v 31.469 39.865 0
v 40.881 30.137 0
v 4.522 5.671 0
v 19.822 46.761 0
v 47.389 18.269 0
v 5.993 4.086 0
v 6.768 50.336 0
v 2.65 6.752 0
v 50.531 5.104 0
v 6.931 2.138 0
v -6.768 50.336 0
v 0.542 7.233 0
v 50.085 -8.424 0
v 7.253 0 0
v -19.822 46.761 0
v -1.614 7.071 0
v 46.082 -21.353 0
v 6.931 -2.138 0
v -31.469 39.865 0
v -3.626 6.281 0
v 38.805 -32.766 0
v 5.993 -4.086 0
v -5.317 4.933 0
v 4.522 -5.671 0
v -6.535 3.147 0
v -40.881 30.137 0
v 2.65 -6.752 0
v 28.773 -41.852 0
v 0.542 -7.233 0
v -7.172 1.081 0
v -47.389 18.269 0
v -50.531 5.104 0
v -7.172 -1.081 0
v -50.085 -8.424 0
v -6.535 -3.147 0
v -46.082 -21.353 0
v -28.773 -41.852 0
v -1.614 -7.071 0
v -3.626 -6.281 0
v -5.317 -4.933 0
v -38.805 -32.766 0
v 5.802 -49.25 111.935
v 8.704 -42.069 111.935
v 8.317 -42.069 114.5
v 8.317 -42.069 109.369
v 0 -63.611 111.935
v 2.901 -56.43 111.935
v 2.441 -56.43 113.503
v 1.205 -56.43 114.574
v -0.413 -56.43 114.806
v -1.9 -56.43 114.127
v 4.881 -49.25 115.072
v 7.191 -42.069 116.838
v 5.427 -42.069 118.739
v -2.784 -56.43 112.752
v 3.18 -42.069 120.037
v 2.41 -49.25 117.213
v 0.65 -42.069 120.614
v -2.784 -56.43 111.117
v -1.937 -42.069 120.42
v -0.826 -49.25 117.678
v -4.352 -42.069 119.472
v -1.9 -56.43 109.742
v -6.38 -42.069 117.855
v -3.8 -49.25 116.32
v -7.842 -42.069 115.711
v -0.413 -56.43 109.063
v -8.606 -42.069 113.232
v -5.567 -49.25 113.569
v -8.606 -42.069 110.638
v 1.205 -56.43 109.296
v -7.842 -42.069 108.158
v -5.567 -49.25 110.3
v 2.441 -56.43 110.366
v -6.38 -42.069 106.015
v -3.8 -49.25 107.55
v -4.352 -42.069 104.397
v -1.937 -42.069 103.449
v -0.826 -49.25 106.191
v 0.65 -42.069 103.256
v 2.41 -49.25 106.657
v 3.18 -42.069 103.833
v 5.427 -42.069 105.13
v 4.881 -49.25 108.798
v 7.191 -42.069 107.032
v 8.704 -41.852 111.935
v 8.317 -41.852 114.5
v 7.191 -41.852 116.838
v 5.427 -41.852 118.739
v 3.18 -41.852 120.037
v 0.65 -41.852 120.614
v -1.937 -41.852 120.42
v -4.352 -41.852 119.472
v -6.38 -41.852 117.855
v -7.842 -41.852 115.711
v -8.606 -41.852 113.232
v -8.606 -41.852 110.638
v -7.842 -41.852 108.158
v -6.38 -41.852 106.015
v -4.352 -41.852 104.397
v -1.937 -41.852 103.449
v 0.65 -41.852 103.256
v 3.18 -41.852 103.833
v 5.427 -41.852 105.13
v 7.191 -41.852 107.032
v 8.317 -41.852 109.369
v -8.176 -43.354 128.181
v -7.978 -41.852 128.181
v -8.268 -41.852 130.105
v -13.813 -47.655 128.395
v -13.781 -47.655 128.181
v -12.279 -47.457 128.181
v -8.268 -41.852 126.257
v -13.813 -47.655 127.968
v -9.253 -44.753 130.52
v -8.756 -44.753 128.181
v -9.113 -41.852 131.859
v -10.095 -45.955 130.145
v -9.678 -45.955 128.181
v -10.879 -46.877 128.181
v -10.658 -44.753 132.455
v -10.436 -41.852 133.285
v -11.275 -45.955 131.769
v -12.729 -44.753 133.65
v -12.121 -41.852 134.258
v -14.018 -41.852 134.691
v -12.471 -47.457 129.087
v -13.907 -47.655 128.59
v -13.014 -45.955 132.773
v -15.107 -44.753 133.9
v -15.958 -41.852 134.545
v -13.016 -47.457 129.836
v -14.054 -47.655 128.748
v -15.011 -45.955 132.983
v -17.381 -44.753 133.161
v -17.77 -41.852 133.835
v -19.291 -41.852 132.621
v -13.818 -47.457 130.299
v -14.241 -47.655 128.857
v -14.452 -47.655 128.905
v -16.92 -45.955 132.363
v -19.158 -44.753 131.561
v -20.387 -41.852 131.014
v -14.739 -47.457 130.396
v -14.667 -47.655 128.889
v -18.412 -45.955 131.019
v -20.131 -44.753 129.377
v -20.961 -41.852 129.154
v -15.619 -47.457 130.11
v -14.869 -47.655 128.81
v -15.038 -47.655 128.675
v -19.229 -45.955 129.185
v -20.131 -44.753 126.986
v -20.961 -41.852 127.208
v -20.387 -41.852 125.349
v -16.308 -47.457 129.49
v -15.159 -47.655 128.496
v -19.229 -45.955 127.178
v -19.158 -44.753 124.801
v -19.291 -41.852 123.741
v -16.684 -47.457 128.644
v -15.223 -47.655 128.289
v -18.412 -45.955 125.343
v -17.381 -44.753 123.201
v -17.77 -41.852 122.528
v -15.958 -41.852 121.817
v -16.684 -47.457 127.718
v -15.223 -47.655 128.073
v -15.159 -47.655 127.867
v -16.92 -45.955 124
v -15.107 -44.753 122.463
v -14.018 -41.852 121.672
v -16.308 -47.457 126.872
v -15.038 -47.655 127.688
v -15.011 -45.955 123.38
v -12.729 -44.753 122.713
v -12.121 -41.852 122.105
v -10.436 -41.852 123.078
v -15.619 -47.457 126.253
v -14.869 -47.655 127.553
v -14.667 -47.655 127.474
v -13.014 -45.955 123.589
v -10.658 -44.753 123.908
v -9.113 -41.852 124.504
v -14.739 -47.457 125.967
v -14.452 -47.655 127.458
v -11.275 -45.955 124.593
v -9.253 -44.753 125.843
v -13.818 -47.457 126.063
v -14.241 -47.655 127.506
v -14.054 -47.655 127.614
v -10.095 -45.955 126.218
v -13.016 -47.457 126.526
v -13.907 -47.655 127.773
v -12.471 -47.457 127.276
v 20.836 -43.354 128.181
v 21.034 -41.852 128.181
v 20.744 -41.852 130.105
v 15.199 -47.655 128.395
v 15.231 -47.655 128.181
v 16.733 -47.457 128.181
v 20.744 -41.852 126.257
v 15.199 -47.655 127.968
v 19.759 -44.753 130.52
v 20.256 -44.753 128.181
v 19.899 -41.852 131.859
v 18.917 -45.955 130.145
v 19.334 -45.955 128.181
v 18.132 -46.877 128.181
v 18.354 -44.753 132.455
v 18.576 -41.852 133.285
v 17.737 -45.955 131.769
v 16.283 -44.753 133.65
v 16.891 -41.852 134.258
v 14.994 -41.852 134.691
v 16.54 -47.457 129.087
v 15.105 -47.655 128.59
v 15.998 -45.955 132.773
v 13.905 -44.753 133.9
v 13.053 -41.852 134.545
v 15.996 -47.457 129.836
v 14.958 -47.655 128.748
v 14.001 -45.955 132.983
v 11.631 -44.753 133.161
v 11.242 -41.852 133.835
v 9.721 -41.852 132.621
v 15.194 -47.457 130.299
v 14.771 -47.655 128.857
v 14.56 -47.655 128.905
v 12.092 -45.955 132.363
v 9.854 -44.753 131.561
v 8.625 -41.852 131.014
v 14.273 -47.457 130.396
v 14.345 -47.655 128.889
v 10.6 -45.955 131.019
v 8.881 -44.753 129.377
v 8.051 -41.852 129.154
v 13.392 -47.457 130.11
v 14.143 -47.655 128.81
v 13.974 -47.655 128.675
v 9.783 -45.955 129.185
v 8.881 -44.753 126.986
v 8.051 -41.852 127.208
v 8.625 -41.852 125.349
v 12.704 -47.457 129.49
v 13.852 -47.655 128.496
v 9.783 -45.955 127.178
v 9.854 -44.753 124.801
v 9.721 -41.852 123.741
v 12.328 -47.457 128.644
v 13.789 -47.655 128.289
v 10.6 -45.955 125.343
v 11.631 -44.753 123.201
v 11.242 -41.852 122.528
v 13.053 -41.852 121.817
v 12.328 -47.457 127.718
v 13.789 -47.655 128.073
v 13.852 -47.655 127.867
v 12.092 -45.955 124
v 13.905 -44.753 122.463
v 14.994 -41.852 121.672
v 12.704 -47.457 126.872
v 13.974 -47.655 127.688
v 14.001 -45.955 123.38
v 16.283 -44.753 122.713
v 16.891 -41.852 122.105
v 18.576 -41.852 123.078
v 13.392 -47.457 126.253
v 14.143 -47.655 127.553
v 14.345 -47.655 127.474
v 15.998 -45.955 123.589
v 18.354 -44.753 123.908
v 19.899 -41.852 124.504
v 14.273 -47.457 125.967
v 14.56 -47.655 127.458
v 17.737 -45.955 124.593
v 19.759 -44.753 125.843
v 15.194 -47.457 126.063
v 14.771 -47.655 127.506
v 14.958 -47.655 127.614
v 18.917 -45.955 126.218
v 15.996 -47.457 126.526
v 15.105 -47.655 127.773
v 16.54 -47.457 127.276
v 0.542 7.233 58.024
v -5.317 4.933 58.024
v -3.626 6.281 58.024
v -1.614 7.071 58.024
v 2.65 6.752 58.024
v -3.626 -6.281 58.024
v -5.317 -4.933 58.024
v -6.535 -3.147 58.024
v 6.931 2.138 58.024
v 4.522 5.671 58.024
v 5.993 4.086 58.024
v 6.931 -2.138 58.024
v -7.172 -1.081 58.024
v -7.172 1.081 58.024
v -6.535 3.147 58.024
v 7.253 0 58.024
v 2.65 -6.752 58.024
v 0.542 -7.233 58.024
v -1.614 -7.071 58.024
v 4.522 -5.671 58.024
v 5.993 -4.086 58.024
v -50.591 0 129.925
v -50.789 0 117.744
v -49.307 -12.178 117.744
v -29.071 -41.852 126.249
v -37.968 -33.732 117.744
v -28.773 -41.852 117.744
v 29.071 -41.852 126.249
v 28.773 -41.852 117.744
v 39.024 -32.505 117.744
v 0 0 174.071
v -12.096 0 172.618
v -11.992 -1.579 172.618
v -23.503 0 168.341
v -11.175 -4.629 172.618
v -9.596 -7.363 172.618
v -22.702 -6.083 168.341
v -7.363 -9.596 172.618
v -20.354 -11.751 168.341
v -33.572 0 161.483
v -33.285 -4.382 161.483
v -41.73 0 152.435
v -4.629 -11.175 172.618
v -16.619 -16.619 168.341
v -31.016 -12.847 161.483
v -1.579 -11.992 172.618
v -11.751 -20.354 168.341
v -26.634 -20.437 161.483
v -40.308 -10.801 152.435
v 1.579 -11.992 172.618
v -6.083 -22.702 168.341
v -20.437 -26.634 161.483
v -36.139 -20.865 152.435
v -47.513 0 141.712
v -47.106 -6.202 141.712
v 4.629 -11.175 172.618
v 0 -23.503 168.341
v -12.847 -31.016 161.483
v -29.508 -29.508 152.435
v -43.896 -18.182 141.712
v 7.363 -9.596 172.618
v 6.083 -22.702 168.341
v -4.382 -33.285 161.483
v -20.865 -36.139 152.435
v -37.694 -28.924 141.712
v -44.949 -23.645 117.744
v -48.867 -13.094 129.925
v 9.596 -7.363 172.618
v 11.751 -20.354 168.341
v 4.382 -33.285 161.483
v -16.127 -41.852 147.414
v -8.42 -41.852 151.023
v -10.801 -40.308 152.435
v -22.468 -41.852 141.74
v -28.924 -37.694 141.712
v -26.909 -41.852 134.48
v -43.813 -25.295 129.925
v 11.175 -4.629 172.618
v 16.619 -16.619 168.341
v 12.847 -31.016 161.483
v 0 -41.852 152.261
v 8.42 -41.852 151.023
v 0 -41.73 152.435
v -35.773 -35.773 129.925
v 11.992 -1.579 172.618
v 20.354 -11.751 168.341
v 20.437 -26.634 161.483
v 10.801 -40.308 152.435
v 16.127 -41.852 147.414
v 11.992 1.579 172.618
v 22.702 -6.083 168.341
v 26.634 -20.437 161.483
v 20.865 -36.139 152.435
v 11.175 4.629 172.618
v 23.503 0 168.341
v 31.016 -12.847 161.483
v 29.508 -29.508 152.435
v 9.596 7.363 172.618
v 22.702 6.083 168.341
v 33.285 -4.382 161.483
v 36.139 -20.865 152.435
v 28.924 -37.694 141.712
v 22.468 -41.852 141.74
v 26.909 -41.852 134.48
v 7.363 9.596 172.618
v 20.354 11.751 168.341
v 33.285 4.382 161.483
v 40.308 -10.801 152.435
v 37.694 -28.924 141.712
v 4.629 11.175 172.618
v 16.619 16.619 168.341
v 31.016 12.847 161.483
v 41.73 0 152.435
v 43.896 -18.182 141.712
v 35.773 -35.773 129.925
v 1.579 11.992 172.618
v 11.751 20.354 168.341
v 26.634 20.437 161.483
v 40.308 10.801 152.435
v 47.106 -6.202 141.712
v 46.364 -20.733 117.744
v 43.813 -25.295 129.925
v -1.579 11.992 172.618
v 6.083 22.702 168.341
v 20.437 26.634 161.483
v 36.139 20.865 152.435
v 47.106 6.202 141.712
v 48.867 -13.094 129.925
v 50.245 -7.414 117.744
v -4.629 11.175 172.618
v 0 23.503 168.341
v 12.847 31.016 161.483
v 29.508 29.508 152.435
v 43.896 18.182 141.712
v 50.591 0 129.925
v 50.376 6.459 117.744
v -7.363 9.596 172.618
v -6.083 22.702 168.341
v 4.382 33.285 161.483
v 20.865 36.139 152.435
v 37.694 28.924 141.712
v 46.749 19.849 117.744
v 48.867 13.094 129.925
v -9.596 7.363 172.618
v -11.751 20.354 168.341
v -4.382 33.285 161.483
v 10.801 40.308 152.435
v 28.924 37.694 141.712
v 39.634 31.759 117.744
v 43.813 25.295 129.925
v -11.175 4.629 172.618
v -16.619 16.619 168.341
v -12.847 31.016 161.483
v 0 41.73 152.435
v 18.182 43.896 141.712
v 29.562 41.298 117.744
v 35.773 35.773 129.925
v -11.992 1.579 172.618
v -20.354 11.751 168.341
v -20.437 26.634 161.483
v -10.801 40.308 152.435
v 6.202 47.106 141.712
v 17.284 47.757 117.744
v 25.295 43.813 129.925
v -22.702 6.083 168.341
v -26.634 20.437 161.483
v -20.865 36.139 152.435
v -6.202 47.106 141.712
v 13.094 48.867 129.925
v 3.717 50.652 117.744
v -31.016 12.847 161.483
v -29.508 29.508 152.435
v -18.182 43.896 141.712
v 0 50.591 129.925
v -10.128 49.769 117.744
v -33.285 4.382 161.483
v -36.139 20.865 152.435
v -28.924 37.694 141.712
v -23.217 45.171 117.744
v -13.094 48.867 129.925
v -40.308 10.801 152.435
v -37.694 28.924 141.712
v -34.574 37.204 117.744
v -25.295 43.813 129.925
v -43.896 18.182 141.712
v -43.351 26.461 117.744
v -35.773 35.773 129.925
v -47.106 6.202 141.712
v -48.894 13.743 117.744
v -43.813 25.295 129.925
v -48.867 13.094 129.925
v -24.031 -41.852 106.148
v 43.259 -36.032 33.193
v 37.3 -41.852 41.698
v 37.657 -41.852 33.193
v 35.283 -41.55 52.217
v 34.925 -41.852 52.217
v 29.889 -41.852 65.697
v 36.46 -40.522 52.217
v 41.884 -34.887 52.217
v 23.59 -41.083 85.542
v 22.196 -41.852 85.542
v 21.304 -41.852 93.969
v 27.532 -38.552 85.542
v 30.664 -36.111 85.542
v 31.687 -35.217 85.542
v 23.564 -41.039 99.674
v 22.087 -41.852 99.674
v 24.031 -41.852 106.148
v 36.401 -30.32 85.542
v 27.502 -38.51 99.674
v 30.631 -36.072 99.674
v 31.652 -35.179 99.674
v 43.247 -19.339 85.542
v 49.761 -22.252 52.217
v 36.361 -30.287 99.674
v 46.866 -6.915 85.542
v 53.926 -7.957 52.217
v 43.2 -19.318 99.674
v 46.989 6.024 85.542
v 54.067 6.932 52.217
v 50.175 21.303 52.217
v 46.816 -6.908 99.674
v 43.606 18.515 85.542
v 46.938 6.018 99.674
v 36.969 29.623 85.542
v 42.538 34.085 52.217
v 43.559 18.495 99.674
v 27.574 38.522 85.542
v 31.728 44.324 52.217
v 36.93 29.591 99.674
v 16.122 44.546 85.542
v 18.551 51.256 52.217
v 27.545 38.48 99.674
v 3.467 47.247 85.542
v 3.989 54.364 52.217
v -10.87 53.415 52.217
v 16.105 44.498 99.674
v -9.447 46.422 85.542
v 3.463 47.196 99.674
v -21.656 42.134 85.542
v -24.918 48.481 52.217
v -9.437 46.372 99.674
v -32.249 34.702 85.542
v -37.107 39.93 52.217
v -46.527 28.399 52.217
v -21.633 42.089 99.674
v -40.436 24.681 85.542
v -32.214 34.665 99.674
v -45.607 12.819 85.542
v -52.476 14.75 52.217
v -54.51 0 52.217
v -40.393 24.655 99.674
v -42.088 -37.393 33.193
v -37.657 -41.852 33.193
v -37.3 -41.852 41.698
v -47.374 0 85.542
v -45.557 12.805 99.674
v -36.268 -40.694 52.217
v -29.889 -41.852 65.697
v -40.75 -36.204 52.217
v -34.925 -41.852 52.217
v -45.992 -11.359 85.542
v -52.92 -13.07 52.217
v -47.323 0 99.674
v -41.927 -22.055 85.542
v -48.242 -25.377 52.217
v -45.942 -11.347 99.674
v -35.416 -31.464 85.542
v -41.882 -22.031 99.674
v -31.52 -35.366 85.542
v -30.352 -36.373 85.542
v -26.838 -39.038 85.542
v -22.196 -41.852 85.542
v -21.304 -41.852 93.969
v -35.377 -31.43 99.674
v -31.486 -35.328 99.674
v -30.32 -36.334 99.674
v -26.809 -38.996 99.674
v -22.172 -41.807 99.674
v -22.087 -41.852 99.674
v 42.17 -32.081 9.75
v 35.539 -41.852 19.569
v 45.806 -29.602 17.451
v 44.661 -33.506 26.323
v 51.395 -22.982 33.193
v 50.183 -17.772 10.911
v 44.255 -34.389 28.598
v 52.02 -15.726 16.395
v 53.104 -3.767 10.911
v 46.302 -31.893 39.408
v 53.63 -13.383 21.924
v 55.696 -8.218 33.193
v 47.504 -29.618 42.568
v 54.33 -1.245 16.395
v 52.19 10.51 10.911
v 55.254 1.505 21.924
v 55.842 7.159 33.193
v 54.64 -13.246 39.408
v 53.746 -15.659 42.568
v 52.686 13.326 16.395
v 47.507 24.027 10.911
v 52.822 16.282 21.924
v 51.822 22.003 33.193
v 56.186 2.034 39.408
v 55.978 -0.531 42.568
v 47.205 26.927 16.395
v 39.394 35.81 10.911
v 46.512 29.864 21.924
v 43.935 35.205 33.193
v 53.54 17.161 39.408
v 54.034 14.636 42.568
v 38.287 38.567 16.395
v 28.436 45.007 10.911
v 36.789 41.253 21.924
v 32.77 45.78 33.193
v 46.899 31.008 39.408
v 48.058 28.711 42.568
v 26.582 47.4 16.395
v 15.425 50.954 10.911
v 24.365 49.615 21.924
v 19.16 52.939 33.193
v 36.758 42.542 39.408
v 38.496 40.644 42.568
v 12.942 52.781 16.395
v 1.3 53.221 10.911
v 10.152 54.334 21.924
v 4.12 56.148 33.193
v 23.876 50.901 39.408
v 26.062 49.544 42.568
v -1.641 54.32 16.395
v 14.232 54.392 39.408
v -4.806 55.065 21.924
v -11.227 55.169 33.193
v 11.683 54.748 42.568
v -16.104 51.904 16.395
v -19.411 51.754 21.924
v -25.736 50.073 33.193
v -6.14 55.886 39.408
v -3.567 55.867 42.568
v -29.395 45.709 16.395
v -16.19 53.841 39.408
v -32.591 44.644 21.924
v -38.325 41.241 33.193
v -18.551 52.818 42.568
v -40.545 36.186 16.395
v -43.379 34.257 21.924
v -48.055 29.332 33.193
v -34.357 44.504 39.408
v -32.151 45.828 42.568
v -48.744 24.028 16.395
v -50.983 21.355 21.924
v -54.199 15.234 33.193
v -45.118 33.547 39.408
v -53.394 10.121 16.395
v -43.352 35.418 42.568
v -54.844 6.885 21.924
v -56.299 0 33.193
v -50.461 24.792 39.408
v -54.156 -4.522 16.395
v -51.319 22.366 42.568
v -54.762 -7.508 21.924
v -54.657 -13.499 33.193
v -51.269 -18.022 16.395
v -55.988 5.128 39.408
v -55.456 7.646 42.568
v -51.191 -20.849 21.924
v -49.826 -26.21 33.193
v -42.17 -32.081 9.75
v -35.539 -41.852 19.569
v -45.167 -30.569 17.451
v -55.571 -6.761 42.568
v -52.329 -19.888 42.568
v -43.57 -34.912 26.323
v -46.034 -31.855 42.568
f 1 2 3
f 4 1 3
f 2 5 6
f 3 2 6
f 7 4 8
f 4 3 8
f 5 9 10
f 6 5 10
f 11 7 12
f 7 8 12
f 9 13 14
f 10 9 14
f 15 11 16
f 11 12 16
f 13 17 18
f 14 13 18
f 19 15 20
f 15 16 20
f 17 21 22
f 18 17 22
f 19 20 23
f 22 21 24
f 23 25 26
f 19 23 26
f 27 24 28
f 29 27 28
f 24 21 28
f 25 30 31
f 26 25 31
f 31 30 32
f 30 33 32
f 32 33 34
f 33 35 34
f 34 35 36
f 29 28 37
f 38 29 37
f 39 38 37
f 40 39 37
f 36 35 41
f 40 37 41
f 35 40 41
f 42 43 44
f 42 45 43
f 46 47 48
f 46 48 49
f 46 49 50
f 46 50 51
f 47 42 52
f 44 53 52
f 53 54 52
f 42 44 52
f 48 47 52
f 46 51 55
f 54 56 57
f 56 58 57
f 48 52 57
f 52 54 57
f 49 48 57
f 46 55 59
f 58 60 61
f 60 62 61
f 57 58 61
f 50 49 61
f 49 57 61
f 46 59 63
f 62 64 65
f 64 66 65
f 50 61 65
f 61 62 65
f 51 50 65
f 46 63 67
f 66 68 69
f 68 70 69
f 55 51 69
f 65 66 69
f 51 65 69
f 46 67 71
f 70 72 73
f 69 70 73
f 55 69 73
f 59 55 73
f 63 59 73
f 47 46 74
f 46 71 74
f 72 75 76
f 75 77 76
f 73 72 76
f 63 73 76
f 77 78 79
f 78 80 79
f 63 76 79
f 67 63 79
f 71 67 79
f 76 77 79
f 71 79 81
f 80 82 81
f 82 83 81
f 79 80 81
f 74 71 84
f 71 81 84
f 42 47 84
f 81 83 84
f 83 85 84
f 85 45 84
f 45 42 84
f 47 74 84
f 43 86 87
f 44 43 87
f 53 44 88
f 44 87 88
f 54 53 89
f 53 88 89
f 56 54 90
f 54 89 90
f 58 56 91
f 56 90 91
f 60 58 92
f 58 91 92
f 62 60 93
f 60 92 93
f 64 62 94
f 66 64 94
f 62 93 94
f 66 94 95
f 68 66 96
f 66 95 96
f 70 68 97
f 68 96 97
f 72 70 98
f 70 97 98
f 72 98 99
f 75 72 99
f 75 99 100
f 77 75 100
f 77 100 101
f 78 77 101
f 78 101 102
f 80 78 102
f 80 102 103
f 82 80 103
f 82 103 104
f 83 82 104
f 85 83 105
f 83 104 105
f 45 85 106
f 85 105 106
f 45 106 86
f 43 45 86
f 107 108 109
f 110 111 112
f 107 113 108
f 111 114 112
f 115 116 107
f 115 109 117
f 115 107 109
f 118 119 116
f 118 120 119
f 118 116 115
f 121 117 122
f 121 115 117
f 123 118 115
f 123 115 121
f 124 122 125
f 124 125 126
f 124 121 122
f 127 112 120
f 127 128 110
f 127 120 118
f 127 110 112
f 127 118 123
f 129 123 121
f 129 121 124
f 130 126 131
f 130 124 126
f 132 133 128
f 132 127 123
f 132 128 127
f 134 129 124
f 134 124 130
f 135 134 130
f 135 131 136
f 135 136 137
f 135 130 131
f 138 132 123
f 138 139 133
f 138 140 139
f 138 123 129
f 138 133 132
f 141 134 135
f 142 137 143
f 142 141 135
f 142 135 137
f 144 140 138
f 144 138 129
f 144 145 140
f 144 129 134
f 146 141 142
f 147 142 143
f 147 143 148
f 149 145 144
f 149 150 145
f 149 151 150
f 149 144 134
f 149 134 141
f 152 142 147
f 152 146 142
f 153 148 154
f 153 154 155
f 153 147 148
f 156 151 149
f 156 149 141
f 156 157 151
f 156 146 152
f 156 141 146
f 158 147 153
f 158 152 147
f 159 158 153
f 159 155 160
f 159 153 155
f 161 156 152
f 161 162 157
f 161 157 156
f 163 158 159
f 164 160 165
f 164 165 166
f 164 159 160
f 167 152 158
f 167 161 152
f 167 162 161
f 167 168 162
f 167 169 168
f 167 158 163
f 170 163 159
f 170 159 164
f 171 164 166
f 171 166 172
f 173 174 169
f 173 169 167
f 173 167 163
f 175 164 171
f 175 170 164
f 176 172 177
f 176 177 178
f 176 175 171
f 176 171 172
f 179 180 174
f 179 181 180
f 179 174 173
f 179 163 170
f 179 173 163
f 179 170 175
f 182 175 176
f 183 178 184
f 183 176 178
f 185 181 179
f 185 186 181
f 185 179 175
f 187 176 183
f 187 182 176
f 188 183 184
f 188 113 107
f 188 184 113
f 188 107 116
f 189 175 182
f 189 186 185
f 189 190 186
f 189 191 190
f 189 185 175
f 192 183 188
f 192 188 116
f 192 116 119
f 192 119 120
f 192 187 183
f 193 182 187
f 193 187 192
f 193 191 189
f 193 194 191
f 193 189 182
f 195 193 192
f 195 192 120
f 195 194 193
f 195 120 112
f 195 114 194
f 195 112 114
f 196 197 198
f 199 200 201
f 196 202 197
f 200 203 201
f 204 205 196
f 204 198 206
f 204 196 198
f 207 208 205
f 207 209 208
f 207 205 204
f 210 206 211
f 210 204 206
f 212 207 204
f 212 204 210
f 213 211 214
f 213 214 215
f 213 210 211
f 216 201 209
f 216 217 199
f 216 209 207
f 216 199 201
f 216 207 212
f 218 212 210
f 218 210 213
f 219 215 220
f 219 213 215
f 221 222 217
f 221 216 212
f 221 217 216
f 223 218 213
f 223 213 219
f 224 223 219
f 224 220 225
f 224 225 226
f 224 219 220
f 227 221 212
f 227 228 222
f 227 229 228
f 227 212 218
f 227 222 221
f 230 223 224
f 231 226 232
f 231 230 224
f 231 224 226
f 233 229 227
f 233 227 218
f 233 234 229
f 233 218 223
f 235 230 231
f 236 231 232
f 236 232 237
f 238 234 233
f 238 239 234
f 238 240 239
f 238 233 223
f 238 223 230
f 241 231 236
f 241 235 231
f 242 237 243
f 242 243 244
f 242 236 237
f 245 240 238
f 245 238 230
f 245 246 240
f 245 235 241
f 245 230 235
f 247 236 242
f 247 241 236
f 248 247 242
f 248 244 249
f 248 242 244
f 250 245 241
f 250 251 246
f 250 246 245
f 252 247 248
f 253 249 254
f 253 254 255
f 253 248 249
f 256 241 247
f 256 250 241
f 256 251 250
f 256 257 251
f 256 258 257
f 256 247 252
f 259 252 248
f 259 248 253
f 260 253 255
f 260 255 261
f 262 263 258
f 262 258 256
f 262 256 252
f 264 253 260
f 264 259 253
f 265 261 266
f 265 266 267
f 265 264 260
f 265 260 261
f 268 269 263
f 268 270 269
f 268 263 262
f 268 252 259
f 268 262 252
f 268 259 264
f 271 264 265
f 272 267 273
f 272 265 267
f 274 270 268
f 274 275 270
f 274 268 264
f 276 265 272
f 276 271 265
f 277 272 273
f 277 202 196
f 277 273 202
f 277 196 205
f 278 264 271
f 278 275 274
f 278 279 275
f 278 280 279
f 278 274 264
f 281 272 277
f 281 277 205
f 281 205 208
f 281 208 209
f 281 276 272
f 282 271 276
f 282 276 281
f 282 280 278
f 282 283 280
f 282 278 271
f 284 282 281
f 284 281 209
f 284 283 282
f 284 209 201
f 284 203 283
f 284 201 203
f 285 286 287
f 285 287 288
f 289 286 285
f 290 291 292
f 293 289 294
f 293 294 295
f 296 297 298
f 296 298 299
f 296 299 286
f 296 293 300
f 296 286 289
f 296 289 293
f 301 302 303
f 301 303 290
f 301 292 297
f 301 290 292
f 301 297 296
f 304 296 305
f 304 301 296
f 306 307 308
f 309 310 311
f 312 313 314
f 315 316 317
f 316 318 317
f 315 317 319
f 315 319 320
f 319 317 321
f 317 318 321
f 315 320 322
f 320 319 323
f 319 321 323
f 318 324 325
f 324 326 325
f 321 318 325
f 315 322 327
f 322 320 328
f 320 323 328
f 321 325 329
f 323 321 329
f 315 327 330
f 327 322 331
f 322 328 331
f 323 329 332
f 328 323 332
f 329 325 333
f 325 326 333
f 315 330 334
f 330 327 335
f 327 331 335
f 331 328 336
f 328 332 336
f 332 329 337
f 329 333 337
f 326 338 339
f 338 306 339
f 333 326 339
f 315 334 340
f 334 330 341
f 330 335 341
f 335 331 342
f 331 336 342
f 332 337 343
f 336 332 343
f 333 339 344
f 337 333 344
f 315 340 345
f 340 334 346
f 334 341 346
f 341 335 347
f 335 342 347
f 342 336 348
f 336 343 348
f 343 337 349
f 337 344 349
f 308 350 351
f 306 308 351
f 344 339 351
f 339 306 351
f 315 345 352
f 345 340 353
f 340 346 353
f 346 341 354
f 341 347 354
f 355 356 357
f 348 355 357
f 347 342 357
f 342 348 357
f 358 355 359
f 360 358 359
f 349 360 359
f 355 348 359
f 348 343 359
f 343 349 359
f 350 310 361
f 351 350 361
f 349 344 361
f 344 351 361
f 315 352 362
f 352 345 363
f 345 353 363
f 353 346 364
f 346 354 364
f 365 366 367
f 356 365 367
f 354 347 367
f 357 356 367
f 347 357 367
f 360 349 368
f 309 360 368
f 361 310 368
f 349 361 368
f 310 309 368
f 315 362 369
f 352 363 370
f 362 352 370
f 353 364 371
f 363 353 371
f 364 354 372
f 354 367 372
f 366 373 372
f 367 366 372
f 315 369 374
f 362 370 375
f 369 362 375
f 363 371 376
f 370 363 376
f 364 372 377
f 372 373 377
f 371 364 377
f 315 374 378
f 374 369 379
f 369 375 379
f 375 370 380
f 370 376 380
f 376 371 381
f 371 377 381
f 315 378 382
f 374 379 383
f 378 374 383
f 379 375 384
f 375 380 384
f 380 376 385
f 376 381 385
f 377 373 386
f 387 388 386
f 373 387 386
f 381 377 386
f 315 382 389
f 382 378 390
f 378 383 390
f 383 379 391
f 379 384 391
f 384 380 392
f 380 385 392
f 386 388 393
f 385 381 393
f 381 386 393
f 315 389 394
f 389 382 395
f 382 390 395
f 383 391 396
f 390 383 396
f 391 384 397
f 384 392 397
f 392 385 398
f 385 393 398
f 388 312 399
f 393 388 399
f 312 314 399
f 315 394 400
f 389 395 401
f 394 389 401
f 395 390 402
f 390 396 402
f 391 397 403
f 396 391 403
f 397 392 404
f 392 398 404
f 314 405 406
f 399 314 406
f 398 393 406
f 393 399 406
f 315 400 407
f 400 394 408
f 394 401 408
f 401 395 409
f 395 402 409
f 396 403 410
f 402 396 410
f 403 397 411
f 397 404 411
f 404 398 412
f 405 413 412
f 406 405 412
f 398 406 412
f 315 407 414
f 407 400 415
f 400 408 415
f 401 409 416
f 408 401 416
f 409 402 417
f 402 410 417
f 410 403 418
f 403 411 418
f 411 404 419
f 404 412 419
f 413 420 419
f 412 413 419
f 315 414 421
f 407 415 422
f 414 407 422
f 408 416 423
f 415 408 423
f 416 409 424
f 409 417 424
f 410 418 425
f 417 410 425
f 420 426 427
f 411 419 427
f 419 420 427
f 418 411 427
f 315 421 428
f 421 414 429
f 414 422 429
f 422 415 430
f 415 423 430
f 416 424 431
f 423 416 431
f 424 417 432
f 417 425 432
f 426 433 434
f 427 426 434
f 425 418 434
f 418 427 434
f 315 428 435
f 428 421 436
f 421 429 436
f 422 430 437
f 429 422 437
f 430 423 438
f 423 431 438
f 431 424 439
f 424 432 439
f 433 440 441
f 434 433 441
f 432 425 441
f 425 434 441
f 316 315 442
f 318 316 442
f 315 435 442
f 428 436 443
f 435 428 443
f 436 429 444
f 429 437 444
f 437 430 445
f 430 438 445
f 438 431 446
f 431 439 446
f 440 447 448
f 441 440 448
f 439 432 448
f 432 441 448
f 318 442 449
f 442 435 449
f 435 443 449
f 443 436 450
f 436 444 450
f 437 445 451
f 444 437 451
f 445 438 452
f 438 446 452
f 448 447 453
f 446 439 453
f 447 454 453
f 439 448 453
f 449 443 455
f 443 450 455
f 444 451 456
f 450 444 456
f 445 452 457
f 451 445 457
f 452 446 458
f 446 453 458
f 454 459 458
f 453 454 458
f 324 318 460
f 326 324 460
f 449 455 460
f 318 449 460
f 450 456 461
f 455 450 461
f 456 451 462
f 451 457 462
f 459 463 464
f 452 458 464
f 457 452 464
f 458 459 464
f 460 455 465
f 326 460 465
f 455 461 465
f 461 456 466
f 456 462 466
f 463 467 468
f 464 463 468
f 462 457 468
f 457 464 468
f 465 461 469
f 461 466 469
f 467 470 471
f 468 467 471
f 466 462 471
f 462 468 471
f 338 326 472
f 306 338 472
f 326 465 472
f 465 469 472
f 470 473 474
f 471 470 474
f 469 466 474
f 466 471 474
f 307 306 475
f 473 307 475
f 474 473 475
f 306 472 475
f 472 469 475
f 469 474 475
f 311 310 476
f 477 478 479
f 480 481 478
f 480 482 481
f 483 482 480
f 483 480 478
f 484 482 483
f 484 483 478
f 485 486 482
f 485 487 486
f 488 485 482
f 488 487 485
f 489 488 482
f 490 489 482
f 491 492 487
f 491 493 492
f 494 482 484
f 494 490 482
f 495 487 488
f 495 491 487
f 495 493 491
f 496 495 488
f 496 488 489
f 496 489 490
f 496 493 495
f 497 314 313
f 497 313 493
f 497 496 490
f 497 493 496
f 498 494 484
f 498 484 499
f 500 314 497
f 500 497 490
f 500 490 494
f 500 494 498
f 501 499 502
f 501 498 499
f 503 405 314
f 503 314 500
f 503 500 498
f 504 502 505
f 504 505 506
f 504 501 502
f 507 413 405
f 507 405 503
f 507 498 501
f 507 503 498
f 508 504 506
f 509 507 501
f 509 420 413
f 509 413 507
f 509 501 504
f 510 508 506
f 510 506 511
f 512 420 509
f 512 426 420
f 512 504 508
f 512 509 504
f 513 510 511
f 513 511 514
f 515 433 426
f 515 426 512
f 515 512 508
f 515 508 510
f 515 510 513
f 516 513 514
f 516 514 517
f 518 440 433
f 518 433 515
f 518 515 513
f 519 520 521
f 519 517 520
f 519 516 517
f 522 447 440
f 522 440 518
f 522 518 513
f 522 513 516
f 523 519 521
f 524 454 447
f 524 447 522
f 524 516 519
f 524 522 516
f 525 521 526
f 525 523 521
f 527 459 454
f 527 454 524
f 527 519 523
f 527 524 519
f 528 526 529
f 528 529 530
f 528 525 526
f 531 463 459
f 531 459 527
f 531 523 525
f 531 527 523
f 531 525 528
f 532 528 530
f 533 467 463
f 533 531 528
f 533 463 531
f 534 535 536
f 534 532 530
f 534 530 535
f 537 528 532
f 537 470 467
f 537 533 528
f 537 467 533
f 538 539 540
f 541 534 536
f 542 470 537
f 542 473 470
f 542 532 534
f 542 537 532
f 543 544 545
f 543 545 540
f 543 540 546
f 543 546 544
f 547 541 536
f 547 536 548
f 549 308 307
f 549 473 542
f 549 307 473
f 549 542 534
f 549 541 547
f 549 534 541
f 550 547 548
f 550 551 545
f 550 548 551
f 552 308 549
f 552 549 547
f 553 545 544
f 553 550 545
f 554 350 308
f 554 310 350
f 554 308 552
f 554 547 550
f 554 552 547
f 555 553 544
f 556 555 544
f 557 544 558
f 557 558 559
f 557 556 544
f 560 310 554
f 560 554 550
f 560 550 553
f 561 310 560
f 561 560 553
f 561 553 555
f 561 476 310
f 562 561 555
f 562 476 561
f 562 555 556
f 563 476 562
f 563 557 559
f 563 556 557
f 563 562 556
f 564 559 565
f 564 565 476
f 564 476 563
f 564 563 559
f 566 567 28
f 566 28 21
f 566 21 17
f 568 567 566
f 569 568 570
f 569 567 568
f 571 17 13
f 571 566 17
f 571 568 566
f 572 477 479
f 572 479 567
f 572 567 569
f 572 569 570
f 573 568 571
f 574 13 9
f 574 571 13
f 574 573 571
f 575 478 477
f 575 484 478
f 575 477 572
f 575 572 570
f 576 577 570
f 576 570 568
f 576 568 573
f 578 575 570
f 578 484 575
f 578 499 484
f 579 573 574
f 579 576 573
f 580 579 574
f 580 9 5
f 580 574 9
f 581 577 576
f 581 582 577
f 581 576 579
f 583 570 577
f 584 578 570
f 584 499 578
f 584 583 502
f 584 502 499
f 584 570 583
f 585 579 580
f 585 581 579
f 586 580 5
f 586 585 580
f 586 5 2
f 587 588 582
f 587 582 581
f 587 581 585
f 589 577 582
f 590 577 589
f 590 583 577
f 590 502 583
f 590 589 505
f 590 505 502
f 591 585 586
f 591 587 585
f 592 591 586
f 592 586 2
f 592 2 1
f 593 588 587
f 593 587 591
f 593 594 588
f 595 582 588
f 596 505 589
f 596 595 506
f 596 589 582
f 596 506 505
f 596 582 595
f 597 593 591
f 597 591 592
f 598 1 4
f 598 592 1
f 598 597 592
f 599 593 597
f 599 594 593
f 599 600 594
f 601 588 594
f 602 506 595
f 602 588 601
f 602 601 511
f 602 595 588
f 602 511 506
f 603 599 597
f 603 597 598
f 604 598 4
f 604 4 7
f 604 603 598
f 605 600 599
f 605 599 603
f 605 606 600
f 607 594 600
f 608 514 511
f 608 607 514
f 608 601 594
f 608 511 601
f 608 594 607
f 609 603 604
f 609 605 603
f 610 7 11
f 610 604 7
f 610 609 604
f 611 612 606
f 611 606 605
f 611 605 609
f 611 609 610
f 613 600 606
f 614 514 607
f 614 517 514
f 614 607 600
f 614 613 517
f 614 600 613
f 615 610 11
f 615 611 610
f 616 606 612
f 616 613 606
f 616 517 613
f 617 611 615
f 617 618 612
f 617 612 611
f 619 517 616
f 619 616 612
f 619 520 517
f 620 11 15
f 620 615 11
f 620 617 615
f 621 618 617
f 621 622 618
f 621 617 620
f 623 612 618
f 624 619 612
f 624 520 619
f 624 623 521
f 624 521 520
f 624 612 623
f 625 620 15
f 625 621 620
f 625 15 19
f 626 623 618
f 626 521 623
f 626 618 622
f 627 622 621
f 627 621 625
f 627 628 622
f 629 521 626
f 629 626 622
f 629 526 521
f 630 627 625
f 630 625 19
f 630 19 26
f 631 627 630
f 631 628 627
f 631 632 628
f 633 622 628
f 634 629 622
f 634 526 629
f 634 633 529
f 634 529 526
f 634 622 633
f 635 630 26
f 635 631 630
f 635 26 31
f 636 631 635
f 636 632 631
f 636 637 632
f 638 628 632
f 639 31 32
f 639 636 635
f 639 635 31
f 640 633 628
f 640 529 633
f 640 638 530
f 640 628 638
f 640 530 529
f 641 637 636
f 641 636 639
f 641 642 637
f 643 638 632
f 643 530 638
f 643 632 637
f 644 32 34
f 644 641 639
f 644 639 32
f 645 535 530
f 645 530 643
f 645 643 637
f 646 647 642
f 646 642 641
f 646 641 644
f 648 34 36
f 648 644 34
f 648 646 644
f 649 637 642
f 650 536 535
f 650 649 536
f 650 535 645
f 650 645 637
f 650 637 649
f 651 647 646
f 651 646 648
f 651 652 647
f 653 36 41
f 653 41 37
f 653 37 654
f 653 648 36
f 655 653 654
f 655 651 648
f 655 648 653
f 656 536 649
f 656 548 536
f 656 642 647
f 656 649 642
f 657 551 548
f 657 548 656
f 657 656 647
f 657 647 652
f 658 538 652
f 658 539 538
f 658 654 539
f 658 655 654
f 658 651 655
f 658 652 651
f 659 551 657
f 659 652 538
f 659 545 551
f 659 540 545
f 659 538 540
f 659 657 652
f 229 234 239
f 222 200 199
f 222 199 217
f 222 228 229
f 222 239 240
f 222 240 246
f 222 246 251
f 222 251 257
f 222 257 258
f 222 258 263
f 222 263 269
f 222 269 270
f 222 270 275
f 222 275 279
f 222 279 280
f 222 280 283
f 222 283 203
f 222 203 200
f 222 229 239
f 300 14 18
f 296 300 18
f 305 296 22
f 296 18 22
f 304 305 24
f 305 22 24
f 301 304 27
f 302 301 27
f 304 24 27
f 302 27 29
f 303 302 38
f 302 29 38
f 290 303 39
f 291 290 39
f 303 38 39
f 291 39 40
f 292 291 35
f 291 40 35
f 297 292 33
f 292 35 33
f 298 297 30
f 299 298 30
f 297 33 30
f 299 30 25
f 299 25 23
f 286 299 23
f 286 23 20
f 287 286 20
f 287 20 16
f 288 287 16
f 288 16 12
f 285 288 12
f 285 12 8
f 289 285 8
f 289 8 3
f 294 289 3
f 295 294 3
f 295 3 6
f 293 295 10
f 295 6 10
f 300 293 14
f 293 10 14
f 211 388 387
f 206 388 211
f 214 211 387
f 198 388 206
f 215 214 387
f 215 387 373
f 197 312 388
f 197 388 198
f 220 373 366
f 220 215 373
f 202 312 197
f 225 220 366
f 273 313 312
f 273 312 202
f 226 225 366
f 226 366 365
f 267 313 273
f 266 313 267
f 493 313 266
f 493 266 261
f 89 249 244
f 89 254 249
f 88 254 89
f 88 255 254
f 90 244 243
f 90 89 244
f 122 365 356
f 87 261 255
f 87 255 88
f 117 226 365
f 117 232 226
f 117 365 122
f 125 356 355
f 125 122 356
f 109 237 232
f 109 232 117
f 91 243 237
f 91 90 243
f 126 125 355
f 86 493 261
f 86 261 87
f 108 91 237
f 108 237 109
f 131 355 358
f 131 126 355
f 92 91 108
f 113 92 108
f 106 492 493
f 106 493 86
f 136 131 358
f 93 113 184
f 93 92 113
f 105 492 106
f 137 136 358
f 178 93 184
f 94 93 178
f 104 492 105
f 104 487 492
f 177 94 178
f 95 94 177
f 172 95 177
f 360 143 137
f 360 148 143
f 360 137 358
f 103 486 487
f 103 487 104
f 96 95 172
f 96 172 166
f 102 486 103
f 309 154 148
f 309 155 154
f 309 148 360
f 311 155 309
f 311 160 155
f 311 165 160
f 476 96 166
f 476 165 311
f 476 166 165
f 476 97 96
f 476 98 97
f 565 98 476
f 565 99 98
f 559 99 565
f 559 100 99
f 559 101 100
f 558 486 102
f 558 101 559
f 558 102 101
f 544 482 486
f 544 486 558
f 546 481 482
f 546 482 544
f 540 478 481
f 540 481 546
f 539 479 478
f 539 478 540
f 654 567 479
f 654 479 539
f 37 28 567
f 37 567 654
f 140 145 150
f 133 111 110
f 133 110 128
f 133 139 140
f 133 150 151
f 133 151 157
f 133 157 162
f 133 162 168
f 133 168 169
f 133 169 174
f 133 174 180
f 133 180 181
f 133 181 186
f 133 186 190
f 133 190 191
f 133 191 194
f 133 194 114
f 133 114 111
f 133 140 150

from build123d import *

# Parameters (mm, degrees)
F3_DEPTH  = 177.8
F4_R      = 7.62
F5_DEPTH  = 19.05
F6_SIZE2  = 18.860161823
F6_SIZE   = 7.62
F4_R_2    = 5.715
F7_DEPTH  = 5.08
F8_R      = 5.07999
F9_R      = 6.35
F10_DEPTH = 50.8
F11_SCALE = 1.1422


# Not quite as in the source:
# - a fillet or chamfer is up to 0.001 mm smaller than in the source, because OpenCascade refuses the exact size


with BuildPart() as f1:
    # F0 (on Front) → F1 (revolve)
    with BuildSketch(Plane.XZ):
        with BuildLine():
            Line((-38.2711647941, 0), (0, 0))
            Line((0, 0), (0, 146.0500033258))
            Line((0, 146.0500033258), (0, 152.4))
            ThreePointArc((0, 152.4), (-33.2006597867, 137.6319951518), (-44.4655865431, 103.0852268133))
            add(Edge.make_bspline(
                [(-44.4655865431, 0), (-47.1114422222, 11.762074058), (-53.3469479224, 35.8297600734), (-37.8272166921, 76.0482431769), (-42.543614325, 94.8604386904), (-44.4655865431, 103.0852268133)],
                knots=[0, 0, 0, 0, 0.3424224234, 0.7066775859, 1, 1, 1, 1], degree=3))
            Line((-44.4655865431, 0), (-38.2711647941, 0))
        make_face()
    revolve(axis=Axis((0, 0, 76.2), (0, 0, 1)))

    # F2 (on Top) → F3 (cut)
    with BuildSketch(Plane.XY):
        Polygon((25.6092443837, -36.641700535), (-25.1907556163, -36.641700535), (-46.7807556163, -36.641700535), (-46.7807556163, -67.121700535), (42.1192443837, -67.121700535), (42.1192443837, -36.641700535), align=None)
    extrude(amount=F3_DEPTH, mode=Mode.SUBTRACT)

    # F4 (on face) → F5 (join)
    with BuildSketch(Plane.XZ.offset(36.641700535)):
        with Locations((0, 97.9992443837)):
            Circle(F4_R)
    extrude(amount=F5_DEPTH)

    # F6
    f6_edges = [f1.edges().sort_by_distance(p)[0] for p in [
        (-7.62, -55.691701, 97.999244),
    ]]
    f6_side = f1.faces().sort_by_distance((0, -55.691701, 97.999244))[0]
    chamfer(f6_edges, length=F6_SIZE, length2=F6_SIZE2, reference=f6_side)

    # F4 (on face) → F7 (join)
    with BuildSketch(Plane.XZ.offset(36.641700535)):
        with Locations((-12.7, 112.2232443837)):
            Circle(F4_R_2)
        with Locations((12.7, 112.2232443837)):
            Circle(F4_R_2)
    extrude(amount=F7_DEPTH)

    # F8 (radius 5.08 in the source; OpenCascade refuses exactly that, so slightly less here)
    f8_edges = [f1.edges().sort_by_distance(p)[0] for p in [
        (-18.415, -41.721701, 112.223244),
        (6.985, -41.721701, 112.223244),
    ]]
    fillet(f8_edges, radius=F8_R)

    # F9 (on face) → F10 (cut)
    with BuildSketch(Plane(origin=(0, 0, 0), x_dir=(1, 0, 0), z_dir=(0, 0, -1))):
        Circle(F9_R)
    extrude(amount=-F10_DEPTH, mode=Mode.SUBTRACT)


with BuildPart() as f1_1:
    # F11: moved
    add(f1.part.scale(F11_SCALE))


solid = f1_1.part
